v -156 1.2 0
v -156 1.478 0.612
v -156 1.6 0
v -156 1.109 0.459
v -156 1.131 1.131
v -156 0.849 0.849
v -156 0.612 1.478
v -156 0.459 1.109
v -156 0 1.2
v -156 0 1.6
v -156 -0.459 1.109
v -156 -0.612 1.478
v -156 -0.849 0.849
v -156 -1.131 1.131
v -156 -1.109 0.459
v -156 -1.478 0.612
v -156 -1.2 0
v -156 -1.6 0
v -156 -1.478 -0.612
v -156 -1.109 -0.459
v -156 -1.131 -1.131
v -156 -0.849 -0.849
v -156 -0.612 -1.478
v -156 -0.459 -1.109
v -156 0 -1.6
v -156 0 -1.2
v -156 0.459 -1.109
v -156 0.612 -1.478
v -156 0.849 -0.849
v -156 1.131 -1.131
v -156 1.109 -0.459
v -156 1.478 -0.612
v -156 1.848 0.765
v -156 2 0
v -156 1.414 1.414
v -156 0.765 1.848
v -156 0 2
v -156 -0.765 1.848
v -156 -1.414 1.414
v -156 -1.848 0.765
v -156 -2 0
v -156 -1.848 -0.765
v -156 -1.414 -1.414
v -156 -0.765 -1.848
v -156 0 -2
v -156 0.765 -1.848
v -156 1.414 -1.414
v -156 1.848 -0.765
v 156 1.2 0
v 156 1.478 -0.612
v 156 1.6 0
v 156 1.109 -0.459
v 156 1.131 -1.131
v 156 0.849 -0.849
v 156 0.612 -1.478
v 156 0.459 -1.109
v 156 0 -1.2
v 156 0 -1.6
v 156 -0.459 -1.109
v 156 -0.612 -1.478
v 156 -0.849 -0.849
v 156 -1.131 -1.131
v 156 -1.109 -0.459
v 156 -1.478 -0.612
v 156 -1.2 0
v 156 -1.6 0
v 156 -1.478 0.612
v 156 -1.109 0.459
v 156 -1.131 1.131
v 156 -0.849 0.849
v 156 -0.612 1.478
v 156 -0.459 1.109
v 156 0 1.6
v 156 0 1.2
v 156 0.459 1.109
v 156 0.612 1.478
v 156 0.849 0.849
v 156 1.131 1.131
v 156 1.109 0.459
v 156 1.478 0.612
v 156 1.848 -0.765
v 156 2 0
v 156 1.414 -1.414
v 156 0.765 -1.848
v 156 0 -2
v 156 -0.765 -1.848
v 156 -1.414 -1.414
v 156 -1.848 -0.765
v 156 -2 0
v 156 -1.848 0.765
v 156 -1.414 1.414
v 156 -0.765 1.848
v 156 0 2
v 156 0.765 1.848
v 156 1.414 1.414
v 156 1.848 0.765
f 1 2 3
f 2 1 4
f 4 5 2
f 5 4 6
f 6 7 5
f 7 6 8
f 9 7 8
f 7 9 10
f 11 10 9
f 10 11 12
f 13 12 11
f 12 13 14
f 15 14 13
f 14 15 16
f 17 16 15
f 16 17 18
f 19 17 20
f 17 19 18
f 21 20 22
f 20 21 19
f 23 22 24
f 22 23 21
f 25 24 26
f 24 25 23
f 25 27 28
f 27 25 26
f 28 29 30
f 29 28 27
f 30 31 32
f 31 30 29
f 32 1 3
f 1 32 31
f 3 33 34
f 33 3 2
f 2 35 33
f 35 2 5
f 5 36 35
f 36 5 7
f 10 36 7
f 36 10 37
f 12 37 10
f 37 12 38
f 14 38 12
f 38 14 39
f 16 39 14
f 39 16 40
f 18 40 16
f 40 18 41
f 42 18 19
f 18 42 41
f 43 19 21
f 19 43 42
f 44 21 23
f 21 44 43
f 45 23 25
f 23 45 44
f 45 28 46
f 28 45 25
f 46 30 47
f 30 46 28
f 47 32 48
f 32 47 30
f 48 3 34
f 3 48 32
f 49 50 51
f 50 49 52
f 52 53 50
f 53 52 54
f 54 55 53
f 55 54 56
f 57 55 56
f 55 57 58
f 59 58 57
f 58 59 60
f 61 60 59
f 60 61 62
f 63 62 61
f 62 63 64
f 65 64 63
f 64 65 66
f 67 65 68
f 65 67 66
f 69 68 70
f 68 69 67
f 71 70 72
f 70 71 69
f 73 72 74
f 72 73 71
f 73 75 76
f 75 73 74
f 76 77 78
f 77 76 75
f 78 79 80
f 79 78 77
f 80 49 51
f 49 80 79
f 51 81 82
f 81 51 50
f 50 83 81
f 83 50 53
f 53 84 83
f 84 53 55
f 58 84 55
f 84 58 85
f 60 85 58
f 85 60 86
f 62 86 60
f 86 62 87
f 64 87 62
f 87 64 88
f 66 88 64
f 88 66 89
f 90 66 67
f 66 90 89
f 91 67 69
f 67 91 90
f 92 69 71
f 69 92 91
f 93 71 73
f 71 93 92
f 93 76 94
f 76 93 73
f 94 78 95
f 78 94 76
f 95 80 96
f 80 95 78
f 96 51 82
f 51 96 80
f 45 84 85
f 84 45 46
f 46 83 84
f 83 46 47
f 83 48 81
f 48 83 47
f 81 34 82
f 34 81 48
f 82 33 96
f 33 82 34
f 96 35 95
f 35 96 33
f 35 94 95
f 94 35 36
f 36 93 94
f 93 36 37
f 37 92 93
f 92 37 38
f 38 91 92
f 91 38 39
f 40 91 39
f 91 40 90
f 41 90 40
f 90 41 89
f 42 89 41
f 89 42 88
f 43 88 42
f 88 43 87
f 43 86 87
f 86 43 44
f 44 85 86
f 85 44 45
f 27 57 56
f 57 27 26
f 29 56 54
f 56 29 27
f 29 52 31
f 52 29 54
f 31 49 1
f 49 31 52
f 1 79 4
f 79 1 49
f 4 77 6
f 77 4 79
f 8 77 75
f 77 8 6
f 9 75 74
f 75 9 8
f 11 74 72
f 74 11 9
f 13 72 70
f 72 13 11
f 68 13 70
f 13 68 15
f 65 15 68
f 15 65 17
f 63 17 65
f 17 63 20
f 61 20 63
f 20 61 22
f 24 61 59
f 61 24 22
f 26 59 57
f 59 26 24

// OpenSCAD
// file: ../p/4-4cyli.scad
use <../lib.scad>
function ldraw_lib__4_4cyli() = [
// 0 Cylinder 1.0
// 0 Name: 4-4cyli.dat
// 0 Author: James Jessiman
// 0 !LDRAW_ORG Primitive UPDATE 2005-01
// 0 !LICENSE Licensed under CC BY 2.0 and CC BY 4.0 : see CAreadme.txt
// 
// 0 BFC CERTIFY CCW
  [0,"BFC","CERTIFY"],
  [0,"BFC","CCW"],
// 
// 0 !HISTORY 1998-12-15 [PTadmin] Official Update 1998-10
// 0 !HISTORY 2002-03-23 [sbliss] Added BFC statement; merged headers from files in distributions LDraw 0.27 and Complete.
// 0 !HISTORY 2002-04-25 [PTadmin] Official Update 2002-02
// 0 !HISTORY 2004-12-14 [guyvivan] BFC CCW
// 0 !HISTORY 2005-12-28 [PTadmin] Official Update 2005-01
// 0 !HISTORY 2007-06-24 [PTadmin] Header formatted for Contributor Agreement
// 0 !HISTORY 2008-07-01 [PTadmin] Official Update 2008-01
// 
// 
// 4 16 1 1 0 0.9239 1 0.3827 0.9239 0 0.3827 1 0 0
  [4,16,1,1,0,0.9239,1,0.3827,0.9239,0,0.3827,1,0,0],
// 5 24 1 0 0 1 1 0 0.9239 0 0.3827 0.9239 0 -0.3827
  [5,24,1,0,0,1,1,0,0.9239,0,0.3827,0.9239,0,-0.3827],
// 4 16 0.9239 1 0.3827 0.7071 1 0.7071 0.7071 0 0.7071 0.9239 0 0.3827
  [4,16,0.9239,1,0.3827,0.7071,1,0.7071,0.7071,0,0.7071,0.9239,0,0.3827],
// 5 24 0.9239 0 0.3827 0.9239 1 0.3827 0.7071 0 0.7071 1 0 0
  [5,24,0.9239,0,0.3827,0.9239,1,0.3827,0.7071,0,0.7071,1,0,0],
// 4 16 0.7071 1 0.7071 0.3827 1 0.9239 0.3827 0 0.9239 0.7071 0 0.7071
  [4,16,0.7071,1,0.7071,0.3827,1,0.9239,0.3827,0,0.9239,0.7071,0,0.7071],
// 5 24 0.7071 0 0.7071 0.7071 1 0.7071 0.3827 0 0.9239 0.9239 0 0.3827
  [5,24,0.7071,0,0.7071,0.7071,1,0.7071,0.3827,0,0.9239,0.9239,0,0.3827],
// 4 16 0.3827 1 0.9239 0 1 1 0 0 1 0.3827 0 0.9239
  [4,16,0.3827,1,0.9239,0,1,1,0,0,1,0.3827,0,0.9239],
// 5 24 0.3827 0 0.9239 0.3827 1 0.9239 0 0 1 0.7071 0 0.7071
  [5,24,0.3827,0,0.9239,0.3827,1,0.9239,0,0,1,0.7071,0,0.7071],
// 4 16 0 1 1 -0.3827 1 0.9239 -0.3827 0 0.9239 0 0 1
  [4,16,0,1,1,-0.3827,1,0.9239,-0.3827,0,0.9239,0,0,1],
// 5 24 0 0 1 0 1 1 -0.3827 0 0.9239 0.3827 0 0.9239
  [5,24,0,0,1,0,1,1,-0.3827,0,0.9239,0.3827,0,0.9239],
// 4 16 -0.3827 1 0.9239 -0.7071 1 0.7071 -0.7071 0 0.7071 -0.3827 0 0.9239
  [4,16,-0.3827,1,0.9239,-0.7071,1,0.7071,-0.7071,0,0.7071,-0.3827,0,0.9239],
// 5 24 -0.3827 0 0.9239 -0.3827 1 0.9239 -0.7071 0 0.7071 0 0 1
  [5,24,-0.3827,0,0.9239,-0.3827,1,0.9239,-0.7071,0,0.7071,0,0,1],
// 4 16 -0.7071 1 0.7071 -0.9239 1 0.3827 -0.9239 0 0.3827 -0.7071 0 0.7071
  [4,16,-0.7071,1,0.7071,-0.9239,1,0.3827,-0.9239,0,0.3827,-0.7071,0,0.7071],
// 5 24 -0.7071 0 0.7071 -0.7071 1 0.7071 -0.9239 0 0.3827 -0.3827 0 0.9239
  [5,24,-0.7071,0,0.7071,-0.7071,1,0.7071,-0.9239,0,0.3827,-0.3827,0,0.9239],
// 4 16 -0.9239 1 0.3827 -1 1 0 -1 0 0 -0.9239 0 0.3827
  [4,16,-0.9239,1,0.3827,-1,1,0,-1,0,0,-0.9239,0,0.3827],
// 5 24 -0.9239 0 0.3827 -0.9239 1 0.3827 -1 0 0 -0.7071 0 0.7071
  [5,24,-0.9239,0,0.3827,-0.9239,1,0.3827,-1,0,0,-0.7071,0,0.7071],
// 4 16 -1 1 0 -0.9239 1 -0.3827 -0.9239 0 -0.3827 -1 0 0
  [4,16,-1,1,0,-0.9239,1,-0.3827,-0.9239,0,-0.3827,-1,0,0],
// 5 24 -1 0 0 -1 1 0 -0.9239 0 -0.3827 -0.9239 0 0.3827
  [5,24,-1,0,0,-1,1,0,-0.9239,0,-0.3827,-0.9239,0,0.3827],
// 4 16 -0.9239 1 -0.3827 -0.7071 1 -0.7071 -0.7071 0 -0.7071 -0.9239 0 -0.3827
  [4,16,-0.9239,1,-0.3827,-0.7071,1,-0.7071,-0.7071,0,-0.7071,-0.9239,0,-0.3827],
// 5 24 -0.9239 0 -0.3827 -0.9239 1 -0.3827 -0.7071 0 -0.7071 -1 0 0
  [5,24,-0.9239,0,-0.3827,-0.9239,1,-0.3827,-0.7071,0,-0.7071,-1,0,0],
// 4 16 -0.7071 1 -0.7071 -0.3827 1 -0.9239 -0.3827 0 -0.9239 -0.7071 0 -0.7071
  [4,16,-0.7071,1,-0.7071,-0.3827,1,-0.9239,-0.3827,0,-0.9239,-0.7071,0,-0.7071],
// 5 24 -0.7071 0 -0.7071 -0.7071 1 -0.7071 -0.3827 0 -0.9239 -0.9239 0 -0.3827
  [5,24,-0.7071,0,-0.7071,-0.7071,1,-0.7071,-0.3827,0,-0.9239,-0.9239,0,-0.3827],
// 4 16 -0.3827 1 -0.9239 0 1 -1 0 0 -1 -0.3827 0 -0.9239
  [4,16,-0.3827,1,-0.9239,0,1,-1,0,0,-1,-0.3827,0,-0.9239],
// 5 24 -0.3827 0 -0.9239 -0.3827 1 -0.9239 0 0 -1 -0.7071 0 -0.7071
  [5,24,-0.3827,0,-0.9239,-0.3827,1,-0.9239,0,0,-1,-0.7071,0,-0.7071],
// 4 16 0 1 -1 0.3827 1 -0.9239 0.3827 0 -0.9239 0 0 -1
  [4,16,0,1,-1,0.3827,1,-0.9239,0.3827,0,-0.9239,0,0,-1],
// 5 24 0 0 -1 0 1 -1 0.3827 0 -0.9239 -0.3827 0 -0.9239
  [5,24,0,0,-1,0,1,-1,0.3827,0,-0.9239,-0.3827,0,-0.9239],
// 4 16 0.3827 1 -0.9239 0.7071 1 -0.7071 0.7071 0 -0.7071 0.3827 0 -0.9239
  [4,16,0.3827,1,-0.9239,0.7071,1,-0.7071,0.7071,0,-0.7071,0.3827,0,-0.9239],
// 5 24 0.3827 0 -0.9239 0.3827 1 -0.9239 0.7071 0 -0.7071 0 0 -1
  [5,24,0.3827,0,-0.9239,0.3827,1,-0.9239,0.7071,0,-0.7071,0,0,-1],
// 4 16 0.7071 1 -0.7071 0.9239 1 -0.3827 0.9239 0 -0.3827 0.7071 0 -0.7071
  [4,16,0.7071,1,-0.7071,0.9239,1,-0.3827,0.9239,0,-0.3827,0.7071,0,-0.7071],
// 5 24 0.7071 0 -0.7071 0.7071 1 -0.7071 0.9239 0 -0.3827 0.3827 0 -0.9239
  [5,24,0.7071,0,-0.7071,0.7071,1,-0.7071,0.9239,0,-0.3827,0.3827,0,-0.9239],
// 4 16 0.9239 1 -0.3827 1 1 0 1 0 0 0.9239 0 -0.3827
  [4,16,0.9239,1,-0.3827,1,1,0,1,0,0,0.9239,0,-0.3827],
// 5 24 0.9239 0 -0.3827 0.9239 1 -0.3827 1 0 0 0.7071 0 -0.7071
  [5,24,0.9239,0,-0.3827,0.9239,1,-0.3827,1,0,0,0.7071,0,-0.7071],
// 0
];
makepoly(ldraw_lib__4_4cyli(), line=0.2);
// file: ../p/4-4ring4.scad
use <../lib.scad>
function ldraw_lib__4_4ring4() = [
// 0 Ring  4 x 1.0
// 0 Name: 4-4ring4.dat
// 0 Author: James Jessiman
// 0 !LDRAW_ORG Primitive UPDATE 2009-01
// 0 !LICENSE Licensed under CC BY 2.0 and CC BY 4.0 : see CAreadme.txt
// 
// 0 BFC CERTIFY CCW
  [0,"BFC","CERTIFY"],
  [0,"BFC","CCW"],
// 
// 0 !HISTORY 1998-12-15 [PTadmin] Official Update 1998-10
// 0 !HISTORY 2002-04-08 [BrickCaster] Modified for BFC compliance
// 0 !HISTORY 2002-04-25 [PTadmin] Official Update 2002-02
// 0 !HISTORY 2007-06-24 [PTadmin] Header formatted for Contributor Agreement
// 0 !HISTORY 2008-07-01 [PTadmin] Official Update 2008-01
// 0 !HISTORY 2008-08-26 [cwdee] Switch polygon winding and rename
// 0 !HISTORY 2009-05-02 [PTadmin] Official Update 2009-01
// 
// 
// 4 16 -1.9135 0 4.6195 -1.5308 0 3.6956 0 0 4 0 0 5
  [4,16,-1.9135,0,4.6195,-1.5308,0,3.6956,0,0,4,0,0,5],
// 4 16 -3.5355 0 3.5355 -2.8284 0 2.8284 -1.5308 0 3.6956 -1.9135 0 4.6195
  [4,16,-3.5355,0,3.5355,-2.8284,0,2.8284,-1.5308,0,3.6956,-1.9135,0,4.6195],
// 4 16 -4.6195 0 1.9135 -3.6956 0 1.5308 -2.8284 0 2.8284 -3.5355 0 3.5355
  [4,16,-4.6195,0,1.9135,-3.6956,0,1.5308,-2.8284,0,2.8284,-3.5355,0,3.5355],
// 4 16 -5 0 0 -4 0 0 -3.6956 0 1.5308 -4.6195 0 1.9135
  [4,16,-5,0,0,-4,0,0,-3.6956,0,1.5308,-4.6195,0,1.9135],
// 4 16 -4.6195 0 -1.9135 -3.6956 0 -1.5308 -4 0 0 -5 0 0
  [4,16,-4.6195,0,-1.9135,-3.6956,0,-1.5308,-4,0,0,-5,0,0],
// 4 16 -3.5355 0 -3.5355 -2.8284 0 -2.8284 -3.6956 0 -1.5308 -4.6195 0 -1.9135
  [4,16,-3.5355,0,-3.5355,-2.8284,0,-2.8284,-3.6956,0,-1.5308,-4.6195,0,-1.9135],
// 4 16 -1.9135 0 -4.6195 -1.5308 0 -3.6956 -2.8284 0 -2.8284 -3.5355 0 -3.5355
  [4,16,-1.9135,0,-4.6195,-1.5308,0,-3.6956,-2.8284,0,-2.8284,-3.5355,0,-3.5355],
// 4 16 0 0 -5 0 0 -4 -1.5308 0 -3.6956 -1.9135 0 -4.6195
  [4,16,0,0,-5,0,0,-4,-1.5308,0,-3.6956,-1.9135,0,-4.6195],
// 4 16 1.9135 0 -4.6195 1.5308 0 -3.6956 0 0 -4 0 0 -5
  [4,16,1.9135,0,-4.6195,1.5308,0,-3.6956,0,0,-4,0,0,-5],
// 4 16 3.5355 0 -3.5355 2.8284 0 -2.8284 1.5308 0 -3.6956 1.9135 0 -4.6195
  [4,16,3.5355,0,-3.5355,2.8284,0,-2.8284,1.5308,0,-3.6956,1.9135,0,-4.6195],
// 4 16 4.6195 0 -1.9135 3.6956 0 -1.5308 2.8284 0 -2.8284 3.5355 0 -3.5355
  [4,16,4.6195,0,-1.9135,3.6956,0,-1.5308,2.8284,0,-2.8284,3.5355,0,-3.5355],
// 4 16 5 0 0 4 0 0 3.6956 0 -1.5308 4.6195 0 -1.9135
  [4,16,5,0,0,4,0,0,3.6956,0,-1.5308,4.6195,0,-1.9135],
// 4 16 4.6195 0 1.9135 3.6956 0 1.5308 4 0 0 5 0 0
  [4,16,4.6195,0,1.9135,3.6956,0,1.5308,4,0,0,5,0,0],
// 4 16 3.5355 0 3.5355 2.8284 0 2.8284 3.6956 0 1.5308 4.6195 0 1.9135
  [4,16,3.5355,0,3.5355,2.8284,0,2.8284,3.6956,0,1.5308,4.6195,0,1.9135],
// 4 16 1.9135 0 4.6195 1.5308 0 3.6956 2.8284 0 2.8284 3.5355 0 3.5355
  [4,16,1.9135,0,4.6195,1.5308,0,3.6956,2.8284,0,2.8284,3.5355,0,3.5355],
// 4 16 0 0 5 0 0 4 1.5308 0 3.6956 1.9135 0 4.6195
  [4,16,0,0,5,0,0,4,1.5308,0,3.6956,1.9135,0,4.6195],
// 0
];
makepoly(ldraw_lib__4_4ring4(), line=0.2);
// file: ../p/4-4ring3.scad
use <../lib.scad>
function ldraw_lib__4_4ring3() = [
// 0 Ring  3 x 1.0
// 0 Name: 4-4ring3.dat
// 0 Author: James Jessiman
// 0 !LDRAW_ORG Primitive UPDATE 2009-01
// 0 !LICENSE Licensed under CC BY 2.0 and CC BY 4.0 : see CAreadme.txt
// 
// 0 BFC CERTIFY CCW
  [0,"BFC","CERTIFY"],
  [0,"BFC","CCW"],
// 
// 0 !HISTORY 1998-12-15 [PTadmin] Official Update 1998-10
// 0 !HISTORY 2002-04-05 [hafhead] Added BFC statement
// 0 !HISTORY 2002-04-25 [PTadmin] Official Update 2002-02
// 0 !HISTORY 2007-06-24 [PTadmin] Header formatted for Contributor Agreement
// 0 !HISTORY 2008-07-01 [PTadmin] Official Update 2008-01
// 0 !HISTORY 2008-08-26 [cwdee] Switch polygon winding and rename
// 0 !HISTORY 2009-05-02 [PTadmin] Official Update 2009-01
// 
// 
// 4 16 -1.5308 0 3.6956 -1.1481 0 2.7717 0 0 3 0 0 4
  [4,16,-1.5308,0,3.6956,-1.1481,0,2.7717,0,0,3,0,0,4],
// 4 16 -2.8284 0 2.8284 -2.1213 0 2.1213 -1.1481 0 2.7717 -1.5308 0 3.6956
  [4,16,-2.8284,0,2.8284,-2.1213,0,2.1213,-1.1481,0,2.7717,-1.5308,0,3.6956],
// 4 16 -3.6956 0 1.5308 -2.7717 0 1.1481 -2.1213 0 2.1213 -2.8284 0 2.8284
  [4,16,-3.6956,0,1.5308,-2.7717,0,1.1481,-2.1213,0,2.1213,-2.8284,0,2.8284],
// 4 16 -4 0 0 -3 0 0 -2.7717 0 1.1481 -3.6956 0 1.5308
  [4,16,-4,0,0,-3,0,0,-2.7717,0,1.1481,-3.6956,0,1.5308],
// 4 16 -3.6956 0 -1.5308 -2.7717 0 -1.1481 -3 0 0 -4 0 0
  [4,16,-3.6956,0,-1.5308,-2.7717,0,-1.1481,-3,0,0,-4,0,0],
// 4 16 -2.8284 0 -2.8284 -2.1213 0 -2.1213 -2.7717 0 -1.1481 -3.6956 0 -1.5308
  [4,16,-2.8284,0,-2.8284,-2.1213,0,-2.1213,-2.7717,0,-1.1481,-3.6956,0,-1.5308],
// 4 16 -1.5308 0 -3.6956 -1.1481 0 -2.7717 -2.1213 0 -2.1213 -2.8284 0 -2.8284
  [4,16,-1.5308,0,-3.6956,-1.1481,0,-2.7717,-2.1213,0,-2.1213,-2.8284,0,-2.8284],
// 4 16 0 0 -4 0 0 -3 -1.1481 0 -2.7717 -1.5308 0 -3.6956
  [4,16,0,0,-4,0,0,-3,-1.1481,0,-2.7717,-1.5308,0,-3.6956],
// 4 16 1.5308 0 -3.6956 1.1481 0 -2.7717 0 0 -3 0 0 -4
  [4,16,1.5308,0,-3.6956,1.1481,0,-2.7717,0,0,-3,0,0,-4],
// 4 16 2.8284 0 -2.8284 2.1213 0 -2.1213 1.1481 0 -2.7717 1.5308 0 -3.6956
  [4,16,2.8284,0,-2.8284,2.1213,0,-2.1213,1.1481,0,-2.7717,1.5308,0,-3.6956],
// 4 16 3.6956 0 -1.5308 2.7717 0 -1.1481 2.1213 0 -2.1213 2.8284 0 -2.8284
  [4,16,3.6956,0,-1.5308,2.7717,0,-1.1481,2.1213,0,-2.1213,2.8284,0,-2.8284],
// 4 16 4 0 0 3 0 0 2.7717 0 -1.1481 3.6956 0 -1.5308
  [4,16,4,0,0,3,0,0,2.7717,0,-1.1481,3.6956,0,-1.5308],
// 4 16 3.6956 0 1.5308 2.7717 0 1.1481 3 0 0 4 0 0
  [4,16,3.6956,0,1.5308,2.7717,0,1.1481,3,0,0,4,0,0],
// 4 16 2.8284 0 2.8284 2.1213 0 2.1213 2.7717 0 1.1481 3.6956 0 1.5308
  [4,16,2.8284,0,2.8284,2.1213,0,2.1213,2.7717,0,1.1481,3.6956,0,1.5308],
// 4 16 1.5308 0 3.6956 1.1481 0 2.7717 2.1213 0 2.1213 2.8284 0 2.8284
  [4,16,1.5308,0,3.6956,1.1481,0,2.7717,2.1213,0,2.1213,2.8284,0,2.8284],
// 4 16 0 0 4 0 0 3 1.1481 0 2.7717 1.5308 0 3.6956
  [4,16,0,0,4,0,0,3,1.1481,0,2.7717,1.5308,0,3.6956],
// 0
];
makepoly(ldraw_lib__4_4ring3(), line=0.2);
// file: ../p/4-4edge.scad
use <../lib.scad>
function ldraw_lib__4_4edge() = [
// 0 Circle 1.0
// 0 Name: 4-4edge.dat
// 0 Author: James Jessiman
// 0 !LDRAW_ORG Primitive UPDATE 2017-01
// 0 !LICENSE Licensed under CC BY 2.0 and CC BY 4.0 : see CAreadme.txt
// 
// 0 BFC CERTIFY CCW
  [0,"BFC","CERTIFY"],
  [0,"BFC","CCW"],
// 
// 0 !HISTORY 1998-12-15 [PTadmin] Official Update 1998-10
// 0 !HISTORY 2005-12-28 [PTadmin] Official Update 2005-01
// 0 !HISTORY 2007-06-24 [PTadmin] Header formatted for Contributor Agreement
// 0 !HISTORY 2008-07-01 [PTadmin] Official Update 2008-01
// 0 !HISTORY 2017-01-15 [Steffen] BFCed
// 0 !HISTORY 2017-12-30 [PTadmin] Official Update 2017-01
// 
// 
// 2 24 1 0 0 0.9239 0 0.3827
  [2,24,1,0,0,0.9239,0,0.3827],
// 2 24 0.9239 0 0.3827 0.7071 0 0.7071
  [2,24,0.9239,0,0.3827,0.7071,0,0.7071],
// 2 24 0.7071 0 0.7071 0.3827 0 0.9239
  [2,24,0.7071,0,0.7071,0.3827,0,0.9239],
// 2 24 0.3827 0 0.9239 0 0 1
  [2,24,0.3827,0,0.9239,0,0,1],
// 2 24 0 0 1 -0.3827 0 0.9239
  [2,24,0,0,1,-0.3827,0,0.9239],
// 2 24 -0.3827 0 0.9239 -0.7071 0 0.7071
  [2,24,-0.3827,0,0.9239,-0.7071,0,0.7071],
// 2 24 -0.7071 0 0.7071 -0.9239 0 0.3827
  [2,24,-0.7071,0,0.7071,-0.9239,0,0.3827],
// 2 24 -0.9239 0 0.3827 -1 0 -0
  [2,24,-0.9239,0,0.3827,-1,0,-0],
// 2 24 -1 0 -0 -0.9239 0 -0.3827
  [2,24,-1,0,-0,-0.9239,0,-0.3827],
// 2 24 -0.9239 0 -0.3827 -0.7071 0 -0.7071
  [2,24,-0.9239,0,-0.3827,-0.7071,0,-0.7071],
// 2 24 -0.7071 0 -0.7071 -0.3827 0 -0.9239
  [2,24,-0.7071,0,-0.7071,-0.3827,0,-0.9239],
// 2 24 -0.3827 0 -0.9239 0 0 -1
  [2,24,-0.3827,0,-0.9239,0,0,-1],
// 2 24 0 0 -1 0.3827 0 -0.9239
  [2,24,0,0,-1,0.3827,0,-0.9239],
// 2 24 0.3827 0 -0.9239 0.7071 0 -0.7071
  [2,24,0.3827,0,-0.9239,0.7071,0,-0.7071],
// 2 24 0.7071 0 -0.7071 0.9239 0 -0.3827
  [2,24,0.7071,0,-0.7071,0.9239,0,-0.3827],
// 2 24 0.9239 0 -0.3827 1 0 0
  [2,24,0.9239,0,-0.3827,1,0,0],
];
makepoly(ldraw_lib__4_4edge(), line=0.2);
// file: 71533k03.scad
use <../lib.scad>
use <../p/4-4cyli.scad>
function ldraw_lib__71533k03() = [
// 0 ~Technic Pneumatic Tube Segment
// 0 Name: 71533k03.dat
// 0 Author: Jaco van der Molen [Jaco]
// 0 !LDRAW_ORG Part Flexible_Section UPDATE 2020-01
// 0 !LICENSE Licensed under CC BY 2.0 and CC BY 4.0 : see CAreadme.txt
// 
// 0 BFC CERTIFY CW
  [0,"BFC","CERTIFY"],
  [0,"BFC","CW"],
// 
// 0 !HISTORY 2003-11-30 [Steffen] BFCed
// 0 !HISTORY 2009-12-29 [PTadmin] Official Update 2009-03
// 0 !HISTORY 2020-06-27 [PTadmin] Renamed from 166
// 0 !HISTORY 2020-06-28 [PTadmin] Official Update 2020-01
// 
// 
// 1 16 0 0 0 5 0 0 0 1 0 0 0 5 4-4cyli.dat
  [1,16,0,0,0,5,0,0,0,1,0,0,0,5, ldraw_lib__4_4cyli()],
// 0 BFC INVERTNEXT
  [0,"BFC","INVERTNEXT"],
// 1 16 0 0 0 3 0 0 0 1 0 0 0 3 4-4cyli.dat
  [1,16,0,0,0,3,0,0,0,1,0,0,0,3, ldraw_lib__4_4cyli()],
// 0
];
makepoly(ldraw_lib__71533k03(), line=0.2);
// file: 71533k02.scad
use <../lib.scad>
use <../p/4-4edge.scad>
use <../p/4-4ring3.scad>
use <../p/4-4ring4.scad>
function ldraw_lib__71533k02() = [
// 0 ~Technic Pneumatic Tube End (Non-Bulged)
// 0 Name: 71533k02.dat
// 0 Author: Steffen [Steffen]
// 0 !LDRAW_ORG Part Flexible_Section UPDATE 2020-01
// 0 !LICENSE Licensed under CC BY 2.0 and CC BY 4.0 : see CAreadme.txt
// 
// 0 BFC CERTIFY CCW
  [0,"BFC","CERTIFY"],
  [0,"BFC","CCW"],
// 
// 0 !HISTORY 2020-06-28 [PTadmin] Official Update 2020-01
// 
// 
// 0 // This file goes together with 71533k01.dat and 71533k03.dat.
// 0 // Those 3 files can be used to create Technic Pneumatic Tubes
// 0 // with either bulged or non-bulged ends.
// 
// 1 16 0 0 0 1 0 0 0 1 0 0 0 1 4-4ring3.dat
  [1,16,0,0,0,1,0,0,0,1,0,0,0,1, ldraw_lib__4_4ring3()],
// 1 16 0 0 0 1 0 0 0 1 0 0 0 1 4-4ring4.dat
  [1,16,0,0,0,1,0,0,0,1,0,0,0,1, ldraw_lib__4_4ring4()],
// 1 16 0 0 0 3 0 0 0 3 0 0 0 3 4-4edge.dat
  [1,16,0,0,0,3,0,0,0,3,0,0,0,3, ldraw_lib__4_4edge()],
// 1 16 0 0 0 5 0 0 0 5 0 0 0 5 4-4edge.dat
  [1,16,0,0,0,5,0,0,0,5,0,0,0,5, ldraw_lib__4_4edge()],
];
makepoly(ldraw_lib__71533k02(), line=0.2);
// main file
use <../lib.scad>
use <71533k02.scad>
use <71533k03.scad>
function ldraw_lib__14661_f1() = [
// 0 Technic Pneumatic Tube 39L
// 0 Name: 14661-f1.dat
// 0 Author: Philippe Hurbain [Philo]
// 0 !LDRAW_ORG Part UPDATE 2020-02
// 0 !LICENSE Licensed under CC BY 2.0 and CC BY 4.0 : see CAreadme.txt
// 
// 0 BFC CERTIFY CCW
  [0,"BFC","CERTIFY"],
  [0,"BFC","CCW"],
// 
// 0 !KEYWORDS 312 mm
// 
// 0 !HISTORY 2020-09-05 [PTadmin] Official Update 2020-02
// 
// 
// 1 16 -390 0 0 0 1 0 1 0 0 0 0 1 71533k02.dat
  [1,16,-390,0,0,0,1,0,1,0,0,0,0,1, ldraw_lib__71533k02()],
// 1 16 390 0 0 0 -1 0 -1 0 0 0 0 1 71533k02.dat
  [1,16,390,0,0,0,-1,0,-1,0,0,0,0,1, ldraw_lib__71533k02()],
// 1 16 -390 0 0 0 780 0 1 0 0 0 0 1 71533k03.dat
  [1,16,-390,0,0,0,780,0,1,0,0,0,0,1, ldraw_lib__71533k03()],
];
makepoly(ldraw_lib__14661_f1(), line=0.2);
